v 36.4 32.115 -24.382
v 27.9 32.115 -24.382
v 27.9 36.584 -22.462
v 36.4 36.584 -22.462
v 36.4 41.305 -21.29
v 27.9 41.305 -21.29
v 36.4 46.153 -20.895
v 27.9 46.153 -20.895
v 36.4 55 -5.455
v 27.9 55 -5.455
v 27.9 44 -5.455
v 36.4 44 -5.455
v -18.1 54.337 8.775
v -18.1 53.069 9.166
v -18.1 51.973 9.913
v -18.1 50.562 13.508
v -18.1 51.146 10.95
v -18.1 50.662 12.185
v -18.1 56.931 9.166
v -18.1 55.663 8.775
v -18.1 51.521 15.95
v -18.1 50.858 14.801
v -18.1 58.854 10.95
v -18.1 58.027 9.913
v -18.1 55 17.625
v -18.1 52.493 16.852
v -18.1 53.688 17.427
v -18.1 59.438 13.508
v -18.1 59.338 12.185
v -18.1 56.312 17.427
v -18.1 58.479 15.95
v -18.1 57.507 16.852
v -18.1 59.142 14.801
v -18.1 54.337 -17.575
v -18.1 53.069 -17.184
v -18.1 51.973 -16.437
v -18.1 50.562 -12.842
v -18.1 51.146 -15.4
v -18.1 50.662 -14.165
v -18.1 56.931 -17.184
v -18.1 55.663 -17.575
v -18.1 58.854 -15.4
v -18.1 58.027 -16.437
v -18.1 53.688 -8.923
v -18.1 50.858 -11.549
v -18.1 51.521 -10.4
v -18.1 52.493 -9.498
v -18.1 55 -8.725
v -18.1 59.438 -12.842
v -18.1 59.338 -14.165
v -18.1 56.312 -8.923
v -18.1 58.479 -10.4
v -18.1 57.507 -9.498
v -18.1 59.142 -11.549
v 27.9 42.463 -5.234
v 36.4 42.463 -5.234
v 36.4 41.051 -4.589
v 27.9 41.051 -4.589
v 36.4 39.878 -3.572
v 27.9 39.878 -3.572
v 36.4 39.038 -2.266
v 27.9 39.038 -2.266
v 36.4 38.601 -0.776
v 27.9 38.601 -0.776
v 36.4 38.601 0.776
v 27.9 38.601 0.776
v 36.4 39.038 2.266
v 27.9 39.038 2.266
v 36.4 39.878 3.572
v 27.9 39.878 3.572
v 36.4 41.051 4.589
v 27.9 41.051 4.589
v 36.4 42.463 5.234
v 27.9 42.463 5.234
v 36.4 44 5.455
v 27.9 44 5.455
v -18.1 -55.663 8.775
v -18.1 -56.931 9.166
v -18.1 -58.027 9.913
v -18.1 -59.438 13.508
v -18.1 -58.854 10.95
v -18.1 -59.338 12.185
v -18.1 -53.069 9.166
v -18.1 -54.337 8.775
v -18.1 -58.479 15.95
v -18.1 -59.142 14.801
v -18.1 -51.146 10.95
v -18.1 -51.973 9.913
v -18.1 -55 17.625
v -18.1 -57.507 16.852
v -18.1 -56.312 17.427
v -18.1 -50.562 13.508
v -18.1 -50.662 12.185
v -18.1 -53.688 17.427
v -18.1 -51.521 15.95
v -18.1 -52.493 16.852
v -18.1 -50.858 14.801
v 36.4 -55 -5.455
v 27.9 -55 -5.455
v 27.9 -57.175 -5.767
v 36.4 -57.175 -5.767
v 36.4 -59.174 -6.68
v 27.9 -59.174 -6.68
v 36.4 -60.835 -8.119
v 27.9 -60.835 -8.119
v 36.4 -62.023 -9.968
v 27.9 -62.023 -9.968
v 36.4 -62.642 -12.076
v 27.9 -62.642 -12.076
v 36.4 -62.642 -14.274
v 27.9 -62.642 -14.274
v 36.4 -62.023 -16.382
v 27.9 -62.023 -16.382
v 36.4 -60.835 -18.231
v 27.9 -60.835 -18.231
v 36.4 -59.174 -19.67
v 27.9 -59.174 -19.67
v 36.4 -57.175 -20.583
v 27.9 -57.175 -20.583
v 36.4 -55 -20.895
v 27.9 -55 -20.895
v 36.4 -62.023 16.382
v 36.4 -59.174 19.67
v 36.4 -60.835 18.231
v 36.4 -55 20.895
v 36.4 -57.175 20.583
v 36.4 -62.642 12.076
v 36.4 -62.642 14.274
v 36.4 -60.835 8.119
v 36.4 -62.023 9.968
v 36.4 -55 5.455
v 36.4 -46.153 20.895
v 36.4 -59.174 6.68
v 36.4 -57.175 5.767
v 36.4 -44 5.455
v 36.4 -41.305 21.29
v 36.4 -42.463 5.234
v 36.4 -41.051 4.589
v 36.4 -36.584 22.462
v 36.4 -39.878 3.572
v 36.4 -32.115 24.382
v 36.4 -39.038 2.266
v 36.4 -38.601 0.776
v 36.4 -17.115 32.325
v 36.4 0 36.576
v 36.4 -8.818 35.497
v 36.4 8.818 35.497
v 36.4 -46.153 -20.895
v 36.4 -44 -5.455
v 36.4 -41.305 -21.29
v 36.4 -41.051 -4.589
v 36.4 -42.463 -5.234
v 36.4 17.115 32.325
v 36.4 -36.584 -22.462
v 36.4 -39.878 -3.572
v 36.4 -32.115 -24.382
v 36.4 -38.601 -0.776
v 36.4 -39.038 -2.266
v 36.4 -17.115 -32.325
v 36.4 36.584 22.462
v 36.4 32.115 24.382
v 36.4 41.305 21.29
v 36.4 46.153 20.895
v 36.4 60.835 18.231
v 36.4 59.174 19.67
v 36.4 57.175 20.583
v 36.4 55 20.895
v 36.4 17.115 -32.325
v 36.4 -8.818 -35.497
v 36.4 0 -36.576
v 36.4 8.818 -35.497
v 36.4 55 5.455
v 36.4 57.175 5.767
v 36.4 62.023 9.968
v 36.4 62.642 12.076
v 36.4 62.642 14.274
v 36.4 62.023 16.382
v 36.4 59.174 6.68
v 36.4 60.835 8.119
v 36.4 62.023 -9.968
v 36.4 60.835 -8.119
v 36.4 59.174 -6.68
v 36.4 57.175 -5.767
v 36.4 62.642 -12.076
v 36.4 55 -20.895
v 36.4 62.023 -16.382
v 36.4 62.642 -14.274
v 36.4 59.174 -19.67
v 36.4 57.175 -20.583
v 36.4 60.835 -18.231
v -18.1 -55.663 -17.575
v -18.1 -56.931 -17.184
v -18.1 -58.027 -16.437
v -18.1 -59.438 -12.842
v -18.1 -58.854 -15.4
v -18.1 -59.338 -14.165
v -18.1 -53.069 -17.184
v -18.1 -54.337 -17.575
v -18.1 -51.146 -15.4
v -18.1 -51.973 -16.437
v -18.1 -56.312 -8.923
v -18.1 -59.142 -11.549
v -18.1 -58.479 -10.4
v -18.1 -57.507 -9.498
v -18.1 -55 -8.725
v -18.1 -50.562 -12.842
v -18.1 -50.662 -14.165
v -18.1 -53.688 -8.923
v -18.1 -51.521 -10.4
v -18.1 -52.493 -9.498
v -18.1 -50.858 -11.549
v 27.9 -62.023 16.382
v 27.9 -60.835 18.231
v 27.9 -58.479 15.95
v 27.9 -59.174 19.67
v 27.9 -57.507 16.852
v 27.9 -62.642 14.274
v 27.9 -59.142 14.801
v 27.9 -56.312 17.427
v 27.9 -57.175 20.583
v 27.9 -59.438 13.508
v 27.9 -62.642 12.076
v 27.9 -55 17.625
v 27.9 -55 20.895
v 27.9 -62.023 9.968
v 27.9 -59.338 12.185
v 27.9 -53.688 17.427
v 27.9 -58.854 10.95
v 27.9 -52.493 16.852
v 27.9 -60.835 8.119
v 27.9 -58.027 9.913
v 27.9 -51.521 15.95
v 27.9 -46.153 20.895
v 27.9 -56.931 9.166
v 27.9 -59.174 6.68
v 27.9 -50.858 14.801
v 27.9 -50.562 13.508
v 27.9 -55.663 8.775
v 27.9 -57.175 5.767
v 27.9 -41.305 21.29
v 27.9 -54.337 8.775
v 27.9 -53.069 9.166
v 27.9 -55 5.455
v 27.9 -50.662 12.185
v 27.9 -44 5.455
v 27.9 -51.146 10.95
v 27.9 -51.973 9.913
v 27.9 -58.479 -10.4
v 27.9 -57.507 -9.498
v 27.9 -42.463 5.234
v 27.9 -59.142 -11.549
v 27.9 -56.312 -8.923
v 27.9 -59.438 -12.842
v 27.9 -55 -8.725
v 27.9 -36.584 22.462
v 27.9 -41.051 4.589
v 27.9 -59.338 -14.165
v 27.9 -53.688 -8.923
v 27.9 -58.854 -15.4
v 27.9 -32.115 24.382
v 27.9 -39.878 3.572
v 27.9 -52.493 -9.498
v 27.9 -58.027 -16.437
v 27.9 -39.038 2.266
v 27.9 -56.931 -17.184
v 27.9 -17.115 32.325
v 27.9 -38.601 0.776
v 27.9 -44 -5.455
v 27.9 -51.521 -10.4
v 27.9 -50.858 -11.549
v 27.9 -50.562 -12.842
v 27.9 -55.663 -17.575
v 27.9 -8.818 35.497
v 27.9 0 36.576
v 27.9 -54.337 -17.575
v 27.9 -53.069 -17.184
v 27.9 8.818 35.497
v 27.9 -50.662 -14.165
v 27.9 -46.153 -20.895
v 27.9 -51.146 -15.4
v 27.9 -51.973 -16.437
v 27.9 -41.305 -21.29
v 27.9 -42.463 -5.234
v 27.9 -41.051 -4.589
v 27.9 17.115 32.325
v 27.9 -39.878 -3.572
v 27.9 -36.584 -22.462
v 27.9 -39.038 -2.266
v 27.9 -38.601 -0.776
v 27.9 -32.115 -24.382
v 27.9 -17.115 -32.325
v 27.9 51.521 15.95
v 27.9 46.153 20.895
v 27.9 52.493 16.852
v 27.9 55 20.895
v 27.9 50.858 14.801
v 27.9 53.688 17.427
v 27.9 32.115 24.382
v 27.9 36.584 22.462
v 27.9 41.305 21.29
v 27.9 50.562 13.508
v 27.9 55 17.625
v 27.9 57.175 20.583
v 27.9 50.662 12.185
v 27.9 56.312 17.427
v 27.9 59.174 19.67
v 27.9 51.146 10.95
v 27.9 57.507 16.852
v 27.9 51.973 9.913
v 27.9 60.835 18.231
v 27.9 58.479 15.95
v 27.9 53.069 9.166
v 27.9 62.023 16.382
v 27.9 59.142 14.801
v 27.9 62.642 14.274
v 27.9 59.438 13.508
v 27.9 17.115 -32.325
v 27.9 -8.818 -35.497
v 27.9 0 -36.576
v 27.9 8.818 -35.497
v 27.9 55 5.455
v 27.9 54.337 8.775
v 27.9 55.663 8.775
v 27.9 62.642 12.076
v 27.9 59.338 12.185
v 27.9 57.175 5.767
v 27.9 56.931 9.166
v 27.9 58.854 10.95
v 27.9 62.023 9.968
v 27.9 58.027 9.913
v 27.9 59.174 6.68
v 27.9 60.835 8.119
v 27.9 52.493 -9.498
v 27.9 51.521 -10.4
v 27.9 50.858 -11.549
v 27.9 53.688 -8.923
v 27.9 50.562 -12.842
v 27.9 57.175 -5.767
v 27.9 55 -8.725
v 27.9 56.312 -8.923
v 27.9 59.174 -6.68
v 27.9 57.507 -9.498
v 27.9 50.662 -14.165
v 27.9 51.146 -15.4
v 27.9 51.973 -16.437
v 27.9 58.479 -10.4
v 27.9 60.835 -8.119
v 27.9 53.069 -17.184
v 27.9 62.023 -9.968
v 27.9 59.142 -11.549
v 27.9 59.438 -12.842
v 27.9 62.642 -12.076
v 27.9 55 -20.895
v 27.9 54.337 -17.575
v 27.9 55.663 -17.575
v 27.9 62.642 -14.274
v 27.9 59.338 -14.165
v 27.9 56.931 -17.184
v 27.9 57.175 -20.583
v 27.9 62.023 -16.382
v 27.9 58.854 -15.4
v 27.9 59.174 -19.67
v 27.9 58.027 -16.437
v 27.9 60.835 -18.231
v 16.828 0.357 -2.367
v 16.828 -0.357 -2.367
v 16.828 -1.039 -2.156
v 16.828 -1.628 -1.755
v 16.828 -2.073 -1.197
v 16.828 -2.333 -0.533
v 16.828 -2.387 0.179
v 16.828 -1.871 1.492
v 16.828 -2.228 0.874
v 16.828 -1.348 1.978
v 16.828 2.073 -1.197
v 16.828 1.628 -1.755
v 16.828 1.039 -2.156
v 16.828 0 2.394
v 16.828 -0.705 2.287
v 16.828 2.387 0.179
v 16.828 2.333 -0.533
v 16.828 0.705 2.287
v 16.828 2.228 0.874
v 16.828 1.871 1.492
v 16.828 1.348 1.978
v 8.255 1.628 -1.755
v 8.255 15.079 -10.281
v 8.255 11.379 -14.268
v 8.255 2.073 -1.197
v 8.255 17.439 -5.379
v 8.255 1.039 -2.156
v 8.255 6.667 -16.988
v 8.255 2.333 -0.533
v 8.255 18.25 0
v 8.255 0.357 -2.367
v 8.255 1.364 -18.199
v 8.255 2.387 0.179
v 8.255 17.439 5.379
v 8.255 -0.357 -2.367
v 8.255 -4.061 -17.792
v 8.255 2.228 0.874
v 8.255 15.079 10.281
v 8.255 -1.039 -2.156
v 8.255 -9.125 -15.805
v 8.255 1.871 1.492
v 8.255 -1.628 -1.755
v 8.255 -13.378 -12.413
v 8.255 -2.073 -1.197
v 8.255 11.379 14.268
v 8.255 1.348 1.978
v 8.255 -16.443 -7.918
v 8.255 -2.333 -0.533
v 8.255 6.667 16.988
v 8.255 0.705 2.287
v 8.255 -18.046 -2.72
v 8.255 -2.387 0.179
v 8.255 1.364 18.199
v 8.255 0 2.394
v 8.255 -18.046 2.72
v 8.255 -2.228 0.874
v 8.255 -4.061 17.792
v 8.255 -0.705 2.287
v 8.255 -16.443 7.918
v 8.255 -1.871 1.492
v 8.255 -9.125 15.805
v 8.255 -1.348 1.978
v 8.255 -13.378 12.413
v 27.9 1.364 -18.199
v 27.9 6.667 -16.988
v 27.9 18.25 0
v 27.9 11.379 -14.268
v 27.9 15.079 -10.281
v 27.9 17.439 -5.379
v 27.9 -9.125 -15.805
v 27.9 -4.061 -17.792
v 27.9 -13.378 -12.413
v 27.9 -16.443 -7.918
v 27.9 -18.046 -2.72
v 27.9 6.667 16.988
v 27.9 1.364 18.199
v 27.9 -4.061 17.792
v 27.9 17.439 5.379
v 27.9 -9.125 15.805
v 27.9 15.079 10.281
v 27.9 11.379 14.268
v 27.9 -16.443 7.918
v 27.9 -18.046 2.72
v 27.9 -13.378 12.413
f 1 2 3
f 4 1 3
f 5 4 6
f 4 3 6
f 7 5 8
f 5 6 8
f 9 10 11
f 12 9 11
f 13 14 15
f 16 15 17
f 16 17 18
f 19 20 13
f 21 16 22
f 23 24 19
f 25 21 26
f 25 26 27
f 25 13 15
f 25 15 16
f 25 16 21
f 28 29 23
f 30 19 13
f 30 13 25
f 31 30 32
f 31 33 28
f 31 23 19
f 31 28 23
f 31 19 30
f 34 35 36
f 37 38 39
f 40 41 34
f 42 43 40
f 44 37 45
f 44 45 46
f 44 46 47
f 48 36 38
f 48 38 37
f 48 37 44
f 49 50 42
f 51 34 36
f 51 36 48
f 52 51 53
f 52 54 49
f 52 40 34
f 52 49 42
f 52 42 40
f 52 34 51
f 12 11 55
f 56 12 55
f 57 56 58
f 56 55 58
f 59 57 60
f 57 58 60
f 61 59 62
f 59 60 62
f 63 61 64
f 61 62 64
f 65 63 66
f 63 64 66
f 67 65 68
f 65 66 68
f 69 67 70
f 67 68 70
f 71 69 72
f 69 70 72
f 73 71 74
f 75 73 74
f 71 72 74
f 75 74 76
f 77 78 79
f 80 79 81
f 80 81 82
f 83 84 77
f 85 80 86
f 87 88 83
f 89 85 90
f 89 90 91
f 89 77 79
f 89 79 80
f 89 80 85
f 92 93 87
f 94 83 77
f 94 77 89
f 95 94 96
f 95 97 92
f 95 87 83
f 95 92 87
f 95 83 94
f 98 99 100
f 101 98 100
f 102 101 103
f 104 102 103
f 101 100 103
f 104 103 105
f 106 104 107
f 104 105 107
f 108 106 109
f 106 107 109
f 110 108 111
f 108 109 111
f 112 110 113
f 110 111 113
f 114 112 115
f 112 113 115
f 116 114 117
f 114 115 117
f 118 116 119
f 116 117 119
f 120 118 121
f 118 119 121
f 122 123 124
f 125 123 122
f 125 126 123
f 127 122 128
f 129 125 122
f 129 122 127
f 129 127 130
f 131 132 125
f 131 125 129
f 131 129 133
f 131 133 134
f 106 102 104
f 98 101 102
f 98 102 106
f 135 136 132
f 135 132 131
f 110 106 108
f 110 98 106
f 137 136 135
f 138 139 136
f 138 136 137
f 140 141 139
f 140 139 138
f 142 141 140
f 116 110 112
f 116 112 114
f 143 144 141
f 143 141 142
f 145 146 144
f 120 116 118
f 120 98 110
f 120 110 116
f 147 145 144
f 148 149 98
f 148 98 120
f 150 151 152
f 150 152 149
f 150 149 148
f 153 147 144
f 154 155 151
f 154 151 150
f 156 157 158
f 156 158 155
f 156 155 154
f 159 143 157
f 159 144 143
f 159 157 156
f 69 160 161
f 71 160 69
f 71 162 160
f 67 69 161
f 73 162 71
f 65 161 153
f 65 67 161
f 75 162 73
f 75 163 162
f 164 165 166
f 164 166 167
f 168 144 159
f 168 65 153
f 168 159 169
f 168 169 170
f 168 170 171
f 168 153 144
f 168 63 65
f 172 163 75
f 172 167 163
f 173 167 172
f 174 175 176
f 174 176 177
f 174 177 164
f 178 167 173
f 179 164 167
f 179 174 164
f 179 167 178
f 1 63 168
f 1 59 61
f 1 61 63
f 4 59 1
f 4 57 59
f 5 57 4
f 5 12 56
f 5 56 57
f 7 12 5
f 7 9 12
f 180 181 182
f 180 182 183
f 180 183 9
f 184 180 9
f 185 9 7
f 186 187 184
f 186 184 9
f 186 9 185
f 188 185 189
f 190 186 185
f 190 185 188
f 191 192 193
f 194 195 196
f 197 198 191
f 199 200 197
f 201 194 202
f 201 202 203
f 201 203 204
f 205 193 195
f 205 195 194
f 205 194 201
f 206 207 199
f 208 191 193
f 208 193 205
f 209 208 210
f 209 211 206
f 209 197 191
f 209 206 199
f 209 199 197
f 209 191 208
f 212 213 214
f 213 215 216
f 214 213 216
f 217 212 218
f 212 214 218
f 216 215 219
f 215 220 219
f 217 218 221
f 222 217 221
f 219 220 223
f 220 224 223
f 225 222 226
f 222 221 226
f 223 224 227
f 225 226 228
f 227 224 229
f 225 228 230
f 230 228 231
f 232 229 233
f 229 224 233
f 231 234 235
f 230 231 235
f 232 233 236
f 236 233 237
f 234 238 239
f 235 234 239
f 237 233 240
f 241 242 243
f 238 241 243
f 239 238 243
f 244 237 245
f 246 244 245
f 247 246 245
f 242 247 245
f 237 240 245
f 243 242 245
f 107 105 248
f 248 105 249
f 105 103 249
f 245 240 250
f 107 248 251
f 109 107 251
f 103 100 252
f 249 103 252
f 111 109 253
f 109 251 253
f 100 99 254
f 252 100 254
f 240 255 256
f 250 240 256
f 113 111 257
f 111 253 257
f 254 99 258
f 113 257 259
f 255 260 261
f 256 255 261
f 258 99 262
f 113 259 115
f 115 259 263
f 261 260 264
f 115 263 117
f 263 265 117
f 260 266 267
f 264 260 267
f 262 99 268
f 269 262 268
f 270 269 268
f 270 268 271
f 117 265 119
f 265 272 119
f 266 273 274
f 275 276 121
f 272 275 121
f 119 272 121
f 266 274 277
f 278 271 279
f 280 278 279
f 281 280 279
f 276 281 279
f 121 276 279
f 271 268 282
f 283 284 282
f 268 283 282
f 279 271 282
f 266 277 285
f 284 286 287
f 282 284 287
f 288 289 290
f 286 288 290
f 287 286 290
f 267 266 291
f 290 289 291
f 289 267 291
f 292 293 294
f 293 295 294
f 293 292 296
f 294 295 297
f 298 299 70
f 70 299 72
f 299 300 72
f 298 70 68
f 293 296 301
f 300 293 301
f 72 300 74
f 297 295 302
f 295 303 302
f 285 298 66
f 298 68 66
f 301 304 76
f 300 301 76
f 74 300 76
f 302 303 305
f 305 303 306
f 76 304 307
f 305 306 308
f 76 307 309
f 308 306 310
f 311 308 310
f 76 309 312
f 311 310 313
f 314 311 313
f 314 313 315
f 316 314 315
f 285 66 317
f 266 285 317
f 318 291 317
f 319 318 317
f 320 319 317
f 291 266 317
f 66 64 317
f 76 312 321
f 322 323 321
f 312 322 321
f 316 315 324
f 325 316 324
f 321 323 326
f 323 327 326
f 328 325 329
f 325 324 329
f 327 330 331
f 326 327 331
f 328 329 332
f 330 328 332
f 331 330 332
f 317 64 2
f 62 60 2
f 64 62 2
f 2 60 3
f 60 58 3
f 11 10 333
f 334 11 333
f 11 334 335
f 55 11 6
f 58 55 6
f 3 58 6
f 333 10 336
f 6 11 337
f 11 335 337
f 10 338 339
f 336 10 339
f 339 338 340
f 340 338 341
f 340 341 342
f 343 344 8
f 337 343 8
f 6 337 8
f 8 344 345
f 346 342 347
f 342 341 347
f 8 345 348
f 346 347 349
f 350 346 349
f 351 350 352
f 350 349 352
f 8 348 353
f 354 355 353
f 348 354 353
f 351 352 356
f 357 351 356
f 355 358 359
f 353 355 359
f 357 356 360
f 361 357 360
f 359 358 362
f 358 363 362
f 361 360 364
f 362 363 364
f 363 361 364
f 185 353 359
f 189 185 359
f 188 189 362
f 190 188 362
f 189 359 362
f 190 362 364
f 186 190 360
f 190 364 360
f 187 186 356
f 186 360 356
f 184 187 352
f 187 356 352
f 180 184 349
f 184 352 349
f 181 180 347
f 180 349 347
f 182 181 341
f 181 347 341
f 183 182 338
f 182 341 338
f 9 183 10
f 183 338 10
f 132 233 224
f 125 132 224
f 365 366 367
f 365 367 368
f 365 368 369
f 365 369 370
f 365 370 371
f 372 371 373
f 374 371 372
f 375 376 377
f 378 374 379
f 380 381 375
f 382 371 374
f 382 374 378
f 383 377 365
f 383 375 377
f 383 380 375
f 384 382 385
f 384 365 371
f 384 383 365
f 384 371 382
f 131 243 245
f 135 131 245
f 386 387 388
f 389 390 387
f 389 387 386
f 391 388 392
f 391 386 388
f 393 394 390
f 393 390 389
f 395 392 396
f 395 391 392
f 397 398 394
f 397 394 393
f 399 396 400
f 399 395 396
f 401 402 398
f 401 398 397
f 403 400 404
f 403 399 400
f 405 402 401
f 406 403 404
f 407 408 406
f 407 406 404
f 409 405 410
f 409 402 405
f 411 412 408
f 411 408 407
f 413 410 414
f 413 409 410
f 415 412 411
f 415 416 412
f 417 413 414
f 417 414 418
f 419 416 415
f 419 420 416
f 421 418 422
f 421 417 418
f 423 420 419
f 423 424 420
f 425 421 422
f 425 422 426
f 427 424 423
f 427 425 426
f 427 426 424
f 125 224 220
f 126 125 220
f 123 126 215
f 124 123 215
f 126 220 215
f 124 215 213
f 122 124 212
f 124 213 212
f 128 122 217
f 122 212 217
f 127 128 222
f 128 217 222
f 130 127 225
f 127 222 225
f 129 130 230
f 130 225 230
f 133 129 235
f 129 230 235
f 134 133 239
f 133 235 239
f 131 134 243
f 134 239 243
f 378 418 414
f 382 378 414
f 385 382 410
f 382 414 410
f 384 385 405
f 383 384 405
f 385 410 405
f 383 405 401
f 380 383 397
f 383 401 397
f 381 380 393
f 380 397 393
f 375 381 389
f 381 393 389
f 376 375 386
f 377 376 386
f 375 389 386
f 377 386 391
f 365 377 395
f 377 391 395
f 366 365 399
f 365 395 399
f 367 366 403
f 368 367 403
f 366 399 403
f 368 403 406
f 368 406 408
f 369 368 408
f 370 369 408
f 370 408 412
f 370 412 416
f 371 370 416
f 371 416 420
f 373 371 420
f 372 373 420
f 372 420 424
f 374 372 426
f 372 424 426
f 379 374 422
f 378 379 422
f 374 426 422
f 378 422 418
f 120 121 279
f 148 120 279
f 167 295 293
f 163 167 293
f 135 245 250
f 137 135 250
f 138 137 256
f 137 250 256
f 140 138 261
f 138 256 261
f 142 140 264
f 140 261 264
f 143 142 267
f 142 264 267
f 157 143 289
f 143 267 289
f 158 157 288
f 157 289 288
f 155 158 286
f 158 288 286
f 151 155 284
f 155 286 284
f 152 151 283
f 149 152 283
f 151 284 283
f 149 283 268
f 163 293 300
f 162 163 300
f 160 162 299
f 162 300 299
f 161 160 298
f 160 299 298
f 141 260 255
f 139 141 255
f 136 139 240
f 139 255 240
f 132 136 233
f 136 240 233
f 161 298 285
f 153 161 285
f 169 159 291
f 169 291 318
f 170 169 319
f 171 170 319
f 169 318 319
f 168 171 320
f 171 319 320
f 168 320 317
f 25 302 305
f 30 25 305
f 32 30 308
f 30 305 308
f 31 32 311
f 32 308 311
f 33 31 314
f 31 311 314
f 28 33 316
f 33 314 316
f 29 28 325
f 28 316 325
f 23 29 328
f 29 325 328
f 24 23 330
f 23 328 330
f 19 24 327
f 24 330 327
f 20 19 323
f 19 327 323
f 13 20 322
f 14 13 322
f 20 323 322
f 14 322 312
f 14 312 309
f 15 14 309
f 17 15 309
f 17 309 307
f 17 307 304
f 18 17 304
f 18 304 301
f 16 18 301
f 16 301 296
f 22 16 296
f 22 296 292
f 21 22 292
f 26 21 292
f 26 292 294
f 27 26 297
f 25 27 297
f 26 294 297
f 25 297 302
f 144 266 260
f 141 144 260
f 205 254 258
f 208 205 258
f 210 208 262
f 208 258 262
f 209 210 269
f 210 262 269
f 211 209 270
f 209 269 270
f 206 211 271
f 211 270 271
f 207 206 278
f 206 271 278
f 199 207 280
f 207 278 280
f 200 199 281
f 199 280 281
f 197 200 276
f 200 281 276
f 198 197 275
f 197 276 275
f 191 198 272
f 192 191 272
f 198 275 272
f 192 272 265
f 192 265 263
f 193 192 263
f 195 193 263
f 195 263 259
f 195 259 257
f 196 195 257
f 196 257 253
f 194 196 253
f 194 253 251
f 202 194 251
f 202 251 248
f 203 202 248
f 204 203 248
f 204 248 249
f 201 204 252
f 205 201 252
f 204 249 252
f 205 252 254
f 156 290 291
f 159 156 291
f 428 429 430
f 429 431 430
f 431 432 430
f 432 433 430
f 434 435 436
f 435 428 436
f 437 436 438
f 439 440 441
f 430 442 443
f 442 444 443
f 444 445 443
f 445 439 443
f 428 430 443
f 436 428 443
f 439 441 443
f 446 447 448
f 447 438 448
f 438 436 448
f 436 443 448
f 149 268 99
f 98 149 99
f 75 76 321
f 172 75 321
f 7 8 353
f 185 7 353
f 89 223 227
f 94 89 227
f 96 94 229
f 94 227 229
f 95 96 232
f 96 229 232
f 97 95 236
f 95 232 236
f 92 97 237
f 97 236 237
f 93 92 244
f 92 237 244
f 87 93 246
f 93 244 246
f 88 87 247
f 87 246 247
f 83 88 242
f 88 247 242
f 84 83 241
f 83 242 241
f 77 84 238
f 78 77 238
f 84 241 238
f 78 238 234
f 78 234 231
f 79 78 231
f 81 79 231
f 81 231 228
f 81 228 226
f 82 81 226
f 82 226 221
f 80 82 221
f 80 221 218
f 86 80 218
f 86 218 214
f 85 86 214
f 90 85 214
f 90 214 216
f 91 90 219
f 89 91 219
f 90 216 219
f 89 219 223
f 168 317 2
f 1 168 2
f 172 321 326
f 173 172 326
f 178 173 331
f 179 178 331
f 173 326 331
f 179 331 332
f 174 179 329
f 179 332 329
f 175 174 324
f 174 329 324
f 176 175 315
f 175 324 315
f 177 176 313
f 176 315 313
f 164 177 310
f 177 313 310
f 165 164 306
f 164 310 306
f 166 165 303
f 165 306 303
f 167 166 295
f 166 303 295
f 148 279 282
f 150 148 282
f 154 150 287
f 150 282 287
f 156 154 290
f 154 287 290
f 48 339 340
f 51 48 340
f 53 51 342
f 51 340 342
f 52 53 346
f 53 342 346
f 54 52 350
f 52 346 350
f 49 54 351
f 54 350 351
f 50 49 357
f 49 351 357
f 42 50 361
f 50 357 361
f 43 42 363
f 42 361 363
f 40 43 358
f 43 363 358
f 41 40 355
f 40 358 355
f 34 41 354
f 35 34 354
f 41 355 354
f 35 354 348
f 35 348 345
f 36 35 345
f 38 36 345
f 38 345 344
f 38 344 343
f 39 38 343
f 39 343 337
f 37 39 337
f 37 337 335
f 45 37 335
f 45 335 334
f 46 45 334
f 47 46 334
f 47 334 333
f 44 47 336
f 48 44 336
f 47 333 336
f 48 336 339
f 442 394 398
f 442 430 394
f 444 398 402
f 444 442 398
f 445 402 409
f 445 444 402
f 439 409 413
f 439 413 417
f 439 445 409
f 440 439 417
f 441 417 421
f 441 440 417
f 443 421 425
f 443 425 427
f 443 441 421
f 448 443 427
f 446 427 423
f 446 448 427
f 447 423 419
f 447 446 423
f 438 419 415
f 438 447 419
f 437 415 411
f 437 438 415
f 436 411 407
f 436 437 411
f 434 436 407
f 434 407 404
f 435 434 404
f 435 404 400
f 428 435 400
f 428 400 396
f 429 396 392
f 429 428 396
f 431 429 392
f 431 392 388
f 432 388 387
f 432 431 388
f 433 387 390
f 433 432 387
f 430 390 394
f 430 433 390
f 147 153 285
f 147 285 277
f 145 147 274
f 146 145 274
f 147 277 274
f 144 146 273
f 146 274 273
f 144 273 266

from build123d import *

# Parameters (mm, degrees)
SKETCH1_W           = 19.645
SKETCH1_H           = 18.25
SKETCH2_R           = 2.3935
CUT_EXTRUDE1_DEPTH  = 8.5725
SKETCH3_R           = 18.25
BOSS_EXTRUDE1_DEPTH = 8.5
SKETCH4_R           = 4.45
BOSS_EXTRUDE2_DEPTH = 46


with BuildPart() as part:
    # Sketch1 → Revolve1 (revolve)
    with BuildSketch(Plane.XY):
        with Locations((18.0775, 9.125)):
            Rectangle(SKETCH1_W, SKETCH1_H)
    revolve(axis=Axis((8.255, 0, 0), (1, 0, 0)))

    # Sketch2 → Cut-Extrude1 (cut)
    with BuildSketch(Plane.ZY.offset(-8.255)):
        Circle(SKETCH2_R)
    extrude(amount=-CUT_EXTRUDE1_DEPTH, mode=Mode.SUBTRACT)


with BuildPart() as body_2:
    # Sketch3 → Boss-Extrude1 (new body)
    with BuildSketch(Plane(origin=(27.9, 0, 0), x_dir=(0, 0, -1), z_dir=(1, 0, 0))):
        with BuildLine():
            Line((-24.382347836, 32.115154563), (-32.324530318, 17.115154563))
            ThreePointArc((-32.324530318, 17.115154563), (-36.576, 0), (-32.324530318, -17.115154563))
            Line((-32.324530318, -17.115154563), (-24.382347836, -32.115154563))
            ThreePointArc((-24.382347836, -32.115154563), (-21.780072988, -38.920854003), (-20.89525, -46.153175037))
            Line((-20.89525, -46.153175037), (-20.89525, -55))
            ThreePointArc((-20.89525, -55), (-13.175, -62.72025), (-5.45475, -55))
            Line((-5.45475, -55), (-5.45475, -44))
            ThreePointArc((-5.45475, -44), (0, -38.54525), (5.45475, -44))
            Line((5.45475, -44), (5.45475, -55))
            ThreePointArc((5.45475, -55), (13.175, -62.72025), (20.89525, -55))
            Line((20.89525, -55), (20.89525, -46.153175037))
            ThreePointArc((20.89525, -46.153175037), (21.780072988, -38.920854003), (24.382347836, -32.115154563))
            Line((24.382347836, -32.115154563), (32.324530318, -17.115154563))
            ThreePointArc((32.324530318, -17.115154563), (36.576, 0), (32.324530318, 17.115154563))
            Line((32.324530318, 17.115154563), (24.382347836, 32.115154563))
            ThreePointArc((24.382347836, 32.115154563), (21.780072988, 38.920854003), (20.89525, 46.153175037))
            Line((20.89525, 46.153175037), (20.89525, 55))
            ThreePointArc((20.89525, 55), (13.175, 62.72025), (5.45475, 55))
            Line((5.45475, 55), (5.45475, 44))
            ThreePointArc((5.45475, 44), (0, 38.54525), (-5.45475, 44))
            Line((-5.45475, 44), (-5.45475, 55))
            ThreePointArc((-5.45475, 55), (-13.175, 62.72025), (-20.89525, 55))
            Line((-20.89525, 55), (-20.89525, 46.153175037))
            ThreePointArc((-20.89525, 46.153175037), (-21.780072988, 38.920854003), (-24.382347836, 32.115154563))
        make_face()
        Circle(SKETCH3_R, mode=Mode.SUBTRACT)
        Circle(SKETCH3_R)
    extrude(amount=BOSS_EXTRUDE1_DEPTH)

    # Sketch4 → Boss-Extrude2 (add)
    with BuildSketch(Plane.ZY.offset(-27.9)):
        with Locations((-13.175, 55)):
            Circle(SKETCH4_R)
        with Locations((13.175, -55)):
            Circle(SKETCH4_R)
        with Locations((13.175, 55)):
            Circle(SKETCH4_R)
        with Locations((-13.175, -55)):
            Circle(SKETCH4_R)
    extrude(amount=BOSS_EXTRUDE2_DEPTH)


solid = Compound([part.part, body_2.part])
